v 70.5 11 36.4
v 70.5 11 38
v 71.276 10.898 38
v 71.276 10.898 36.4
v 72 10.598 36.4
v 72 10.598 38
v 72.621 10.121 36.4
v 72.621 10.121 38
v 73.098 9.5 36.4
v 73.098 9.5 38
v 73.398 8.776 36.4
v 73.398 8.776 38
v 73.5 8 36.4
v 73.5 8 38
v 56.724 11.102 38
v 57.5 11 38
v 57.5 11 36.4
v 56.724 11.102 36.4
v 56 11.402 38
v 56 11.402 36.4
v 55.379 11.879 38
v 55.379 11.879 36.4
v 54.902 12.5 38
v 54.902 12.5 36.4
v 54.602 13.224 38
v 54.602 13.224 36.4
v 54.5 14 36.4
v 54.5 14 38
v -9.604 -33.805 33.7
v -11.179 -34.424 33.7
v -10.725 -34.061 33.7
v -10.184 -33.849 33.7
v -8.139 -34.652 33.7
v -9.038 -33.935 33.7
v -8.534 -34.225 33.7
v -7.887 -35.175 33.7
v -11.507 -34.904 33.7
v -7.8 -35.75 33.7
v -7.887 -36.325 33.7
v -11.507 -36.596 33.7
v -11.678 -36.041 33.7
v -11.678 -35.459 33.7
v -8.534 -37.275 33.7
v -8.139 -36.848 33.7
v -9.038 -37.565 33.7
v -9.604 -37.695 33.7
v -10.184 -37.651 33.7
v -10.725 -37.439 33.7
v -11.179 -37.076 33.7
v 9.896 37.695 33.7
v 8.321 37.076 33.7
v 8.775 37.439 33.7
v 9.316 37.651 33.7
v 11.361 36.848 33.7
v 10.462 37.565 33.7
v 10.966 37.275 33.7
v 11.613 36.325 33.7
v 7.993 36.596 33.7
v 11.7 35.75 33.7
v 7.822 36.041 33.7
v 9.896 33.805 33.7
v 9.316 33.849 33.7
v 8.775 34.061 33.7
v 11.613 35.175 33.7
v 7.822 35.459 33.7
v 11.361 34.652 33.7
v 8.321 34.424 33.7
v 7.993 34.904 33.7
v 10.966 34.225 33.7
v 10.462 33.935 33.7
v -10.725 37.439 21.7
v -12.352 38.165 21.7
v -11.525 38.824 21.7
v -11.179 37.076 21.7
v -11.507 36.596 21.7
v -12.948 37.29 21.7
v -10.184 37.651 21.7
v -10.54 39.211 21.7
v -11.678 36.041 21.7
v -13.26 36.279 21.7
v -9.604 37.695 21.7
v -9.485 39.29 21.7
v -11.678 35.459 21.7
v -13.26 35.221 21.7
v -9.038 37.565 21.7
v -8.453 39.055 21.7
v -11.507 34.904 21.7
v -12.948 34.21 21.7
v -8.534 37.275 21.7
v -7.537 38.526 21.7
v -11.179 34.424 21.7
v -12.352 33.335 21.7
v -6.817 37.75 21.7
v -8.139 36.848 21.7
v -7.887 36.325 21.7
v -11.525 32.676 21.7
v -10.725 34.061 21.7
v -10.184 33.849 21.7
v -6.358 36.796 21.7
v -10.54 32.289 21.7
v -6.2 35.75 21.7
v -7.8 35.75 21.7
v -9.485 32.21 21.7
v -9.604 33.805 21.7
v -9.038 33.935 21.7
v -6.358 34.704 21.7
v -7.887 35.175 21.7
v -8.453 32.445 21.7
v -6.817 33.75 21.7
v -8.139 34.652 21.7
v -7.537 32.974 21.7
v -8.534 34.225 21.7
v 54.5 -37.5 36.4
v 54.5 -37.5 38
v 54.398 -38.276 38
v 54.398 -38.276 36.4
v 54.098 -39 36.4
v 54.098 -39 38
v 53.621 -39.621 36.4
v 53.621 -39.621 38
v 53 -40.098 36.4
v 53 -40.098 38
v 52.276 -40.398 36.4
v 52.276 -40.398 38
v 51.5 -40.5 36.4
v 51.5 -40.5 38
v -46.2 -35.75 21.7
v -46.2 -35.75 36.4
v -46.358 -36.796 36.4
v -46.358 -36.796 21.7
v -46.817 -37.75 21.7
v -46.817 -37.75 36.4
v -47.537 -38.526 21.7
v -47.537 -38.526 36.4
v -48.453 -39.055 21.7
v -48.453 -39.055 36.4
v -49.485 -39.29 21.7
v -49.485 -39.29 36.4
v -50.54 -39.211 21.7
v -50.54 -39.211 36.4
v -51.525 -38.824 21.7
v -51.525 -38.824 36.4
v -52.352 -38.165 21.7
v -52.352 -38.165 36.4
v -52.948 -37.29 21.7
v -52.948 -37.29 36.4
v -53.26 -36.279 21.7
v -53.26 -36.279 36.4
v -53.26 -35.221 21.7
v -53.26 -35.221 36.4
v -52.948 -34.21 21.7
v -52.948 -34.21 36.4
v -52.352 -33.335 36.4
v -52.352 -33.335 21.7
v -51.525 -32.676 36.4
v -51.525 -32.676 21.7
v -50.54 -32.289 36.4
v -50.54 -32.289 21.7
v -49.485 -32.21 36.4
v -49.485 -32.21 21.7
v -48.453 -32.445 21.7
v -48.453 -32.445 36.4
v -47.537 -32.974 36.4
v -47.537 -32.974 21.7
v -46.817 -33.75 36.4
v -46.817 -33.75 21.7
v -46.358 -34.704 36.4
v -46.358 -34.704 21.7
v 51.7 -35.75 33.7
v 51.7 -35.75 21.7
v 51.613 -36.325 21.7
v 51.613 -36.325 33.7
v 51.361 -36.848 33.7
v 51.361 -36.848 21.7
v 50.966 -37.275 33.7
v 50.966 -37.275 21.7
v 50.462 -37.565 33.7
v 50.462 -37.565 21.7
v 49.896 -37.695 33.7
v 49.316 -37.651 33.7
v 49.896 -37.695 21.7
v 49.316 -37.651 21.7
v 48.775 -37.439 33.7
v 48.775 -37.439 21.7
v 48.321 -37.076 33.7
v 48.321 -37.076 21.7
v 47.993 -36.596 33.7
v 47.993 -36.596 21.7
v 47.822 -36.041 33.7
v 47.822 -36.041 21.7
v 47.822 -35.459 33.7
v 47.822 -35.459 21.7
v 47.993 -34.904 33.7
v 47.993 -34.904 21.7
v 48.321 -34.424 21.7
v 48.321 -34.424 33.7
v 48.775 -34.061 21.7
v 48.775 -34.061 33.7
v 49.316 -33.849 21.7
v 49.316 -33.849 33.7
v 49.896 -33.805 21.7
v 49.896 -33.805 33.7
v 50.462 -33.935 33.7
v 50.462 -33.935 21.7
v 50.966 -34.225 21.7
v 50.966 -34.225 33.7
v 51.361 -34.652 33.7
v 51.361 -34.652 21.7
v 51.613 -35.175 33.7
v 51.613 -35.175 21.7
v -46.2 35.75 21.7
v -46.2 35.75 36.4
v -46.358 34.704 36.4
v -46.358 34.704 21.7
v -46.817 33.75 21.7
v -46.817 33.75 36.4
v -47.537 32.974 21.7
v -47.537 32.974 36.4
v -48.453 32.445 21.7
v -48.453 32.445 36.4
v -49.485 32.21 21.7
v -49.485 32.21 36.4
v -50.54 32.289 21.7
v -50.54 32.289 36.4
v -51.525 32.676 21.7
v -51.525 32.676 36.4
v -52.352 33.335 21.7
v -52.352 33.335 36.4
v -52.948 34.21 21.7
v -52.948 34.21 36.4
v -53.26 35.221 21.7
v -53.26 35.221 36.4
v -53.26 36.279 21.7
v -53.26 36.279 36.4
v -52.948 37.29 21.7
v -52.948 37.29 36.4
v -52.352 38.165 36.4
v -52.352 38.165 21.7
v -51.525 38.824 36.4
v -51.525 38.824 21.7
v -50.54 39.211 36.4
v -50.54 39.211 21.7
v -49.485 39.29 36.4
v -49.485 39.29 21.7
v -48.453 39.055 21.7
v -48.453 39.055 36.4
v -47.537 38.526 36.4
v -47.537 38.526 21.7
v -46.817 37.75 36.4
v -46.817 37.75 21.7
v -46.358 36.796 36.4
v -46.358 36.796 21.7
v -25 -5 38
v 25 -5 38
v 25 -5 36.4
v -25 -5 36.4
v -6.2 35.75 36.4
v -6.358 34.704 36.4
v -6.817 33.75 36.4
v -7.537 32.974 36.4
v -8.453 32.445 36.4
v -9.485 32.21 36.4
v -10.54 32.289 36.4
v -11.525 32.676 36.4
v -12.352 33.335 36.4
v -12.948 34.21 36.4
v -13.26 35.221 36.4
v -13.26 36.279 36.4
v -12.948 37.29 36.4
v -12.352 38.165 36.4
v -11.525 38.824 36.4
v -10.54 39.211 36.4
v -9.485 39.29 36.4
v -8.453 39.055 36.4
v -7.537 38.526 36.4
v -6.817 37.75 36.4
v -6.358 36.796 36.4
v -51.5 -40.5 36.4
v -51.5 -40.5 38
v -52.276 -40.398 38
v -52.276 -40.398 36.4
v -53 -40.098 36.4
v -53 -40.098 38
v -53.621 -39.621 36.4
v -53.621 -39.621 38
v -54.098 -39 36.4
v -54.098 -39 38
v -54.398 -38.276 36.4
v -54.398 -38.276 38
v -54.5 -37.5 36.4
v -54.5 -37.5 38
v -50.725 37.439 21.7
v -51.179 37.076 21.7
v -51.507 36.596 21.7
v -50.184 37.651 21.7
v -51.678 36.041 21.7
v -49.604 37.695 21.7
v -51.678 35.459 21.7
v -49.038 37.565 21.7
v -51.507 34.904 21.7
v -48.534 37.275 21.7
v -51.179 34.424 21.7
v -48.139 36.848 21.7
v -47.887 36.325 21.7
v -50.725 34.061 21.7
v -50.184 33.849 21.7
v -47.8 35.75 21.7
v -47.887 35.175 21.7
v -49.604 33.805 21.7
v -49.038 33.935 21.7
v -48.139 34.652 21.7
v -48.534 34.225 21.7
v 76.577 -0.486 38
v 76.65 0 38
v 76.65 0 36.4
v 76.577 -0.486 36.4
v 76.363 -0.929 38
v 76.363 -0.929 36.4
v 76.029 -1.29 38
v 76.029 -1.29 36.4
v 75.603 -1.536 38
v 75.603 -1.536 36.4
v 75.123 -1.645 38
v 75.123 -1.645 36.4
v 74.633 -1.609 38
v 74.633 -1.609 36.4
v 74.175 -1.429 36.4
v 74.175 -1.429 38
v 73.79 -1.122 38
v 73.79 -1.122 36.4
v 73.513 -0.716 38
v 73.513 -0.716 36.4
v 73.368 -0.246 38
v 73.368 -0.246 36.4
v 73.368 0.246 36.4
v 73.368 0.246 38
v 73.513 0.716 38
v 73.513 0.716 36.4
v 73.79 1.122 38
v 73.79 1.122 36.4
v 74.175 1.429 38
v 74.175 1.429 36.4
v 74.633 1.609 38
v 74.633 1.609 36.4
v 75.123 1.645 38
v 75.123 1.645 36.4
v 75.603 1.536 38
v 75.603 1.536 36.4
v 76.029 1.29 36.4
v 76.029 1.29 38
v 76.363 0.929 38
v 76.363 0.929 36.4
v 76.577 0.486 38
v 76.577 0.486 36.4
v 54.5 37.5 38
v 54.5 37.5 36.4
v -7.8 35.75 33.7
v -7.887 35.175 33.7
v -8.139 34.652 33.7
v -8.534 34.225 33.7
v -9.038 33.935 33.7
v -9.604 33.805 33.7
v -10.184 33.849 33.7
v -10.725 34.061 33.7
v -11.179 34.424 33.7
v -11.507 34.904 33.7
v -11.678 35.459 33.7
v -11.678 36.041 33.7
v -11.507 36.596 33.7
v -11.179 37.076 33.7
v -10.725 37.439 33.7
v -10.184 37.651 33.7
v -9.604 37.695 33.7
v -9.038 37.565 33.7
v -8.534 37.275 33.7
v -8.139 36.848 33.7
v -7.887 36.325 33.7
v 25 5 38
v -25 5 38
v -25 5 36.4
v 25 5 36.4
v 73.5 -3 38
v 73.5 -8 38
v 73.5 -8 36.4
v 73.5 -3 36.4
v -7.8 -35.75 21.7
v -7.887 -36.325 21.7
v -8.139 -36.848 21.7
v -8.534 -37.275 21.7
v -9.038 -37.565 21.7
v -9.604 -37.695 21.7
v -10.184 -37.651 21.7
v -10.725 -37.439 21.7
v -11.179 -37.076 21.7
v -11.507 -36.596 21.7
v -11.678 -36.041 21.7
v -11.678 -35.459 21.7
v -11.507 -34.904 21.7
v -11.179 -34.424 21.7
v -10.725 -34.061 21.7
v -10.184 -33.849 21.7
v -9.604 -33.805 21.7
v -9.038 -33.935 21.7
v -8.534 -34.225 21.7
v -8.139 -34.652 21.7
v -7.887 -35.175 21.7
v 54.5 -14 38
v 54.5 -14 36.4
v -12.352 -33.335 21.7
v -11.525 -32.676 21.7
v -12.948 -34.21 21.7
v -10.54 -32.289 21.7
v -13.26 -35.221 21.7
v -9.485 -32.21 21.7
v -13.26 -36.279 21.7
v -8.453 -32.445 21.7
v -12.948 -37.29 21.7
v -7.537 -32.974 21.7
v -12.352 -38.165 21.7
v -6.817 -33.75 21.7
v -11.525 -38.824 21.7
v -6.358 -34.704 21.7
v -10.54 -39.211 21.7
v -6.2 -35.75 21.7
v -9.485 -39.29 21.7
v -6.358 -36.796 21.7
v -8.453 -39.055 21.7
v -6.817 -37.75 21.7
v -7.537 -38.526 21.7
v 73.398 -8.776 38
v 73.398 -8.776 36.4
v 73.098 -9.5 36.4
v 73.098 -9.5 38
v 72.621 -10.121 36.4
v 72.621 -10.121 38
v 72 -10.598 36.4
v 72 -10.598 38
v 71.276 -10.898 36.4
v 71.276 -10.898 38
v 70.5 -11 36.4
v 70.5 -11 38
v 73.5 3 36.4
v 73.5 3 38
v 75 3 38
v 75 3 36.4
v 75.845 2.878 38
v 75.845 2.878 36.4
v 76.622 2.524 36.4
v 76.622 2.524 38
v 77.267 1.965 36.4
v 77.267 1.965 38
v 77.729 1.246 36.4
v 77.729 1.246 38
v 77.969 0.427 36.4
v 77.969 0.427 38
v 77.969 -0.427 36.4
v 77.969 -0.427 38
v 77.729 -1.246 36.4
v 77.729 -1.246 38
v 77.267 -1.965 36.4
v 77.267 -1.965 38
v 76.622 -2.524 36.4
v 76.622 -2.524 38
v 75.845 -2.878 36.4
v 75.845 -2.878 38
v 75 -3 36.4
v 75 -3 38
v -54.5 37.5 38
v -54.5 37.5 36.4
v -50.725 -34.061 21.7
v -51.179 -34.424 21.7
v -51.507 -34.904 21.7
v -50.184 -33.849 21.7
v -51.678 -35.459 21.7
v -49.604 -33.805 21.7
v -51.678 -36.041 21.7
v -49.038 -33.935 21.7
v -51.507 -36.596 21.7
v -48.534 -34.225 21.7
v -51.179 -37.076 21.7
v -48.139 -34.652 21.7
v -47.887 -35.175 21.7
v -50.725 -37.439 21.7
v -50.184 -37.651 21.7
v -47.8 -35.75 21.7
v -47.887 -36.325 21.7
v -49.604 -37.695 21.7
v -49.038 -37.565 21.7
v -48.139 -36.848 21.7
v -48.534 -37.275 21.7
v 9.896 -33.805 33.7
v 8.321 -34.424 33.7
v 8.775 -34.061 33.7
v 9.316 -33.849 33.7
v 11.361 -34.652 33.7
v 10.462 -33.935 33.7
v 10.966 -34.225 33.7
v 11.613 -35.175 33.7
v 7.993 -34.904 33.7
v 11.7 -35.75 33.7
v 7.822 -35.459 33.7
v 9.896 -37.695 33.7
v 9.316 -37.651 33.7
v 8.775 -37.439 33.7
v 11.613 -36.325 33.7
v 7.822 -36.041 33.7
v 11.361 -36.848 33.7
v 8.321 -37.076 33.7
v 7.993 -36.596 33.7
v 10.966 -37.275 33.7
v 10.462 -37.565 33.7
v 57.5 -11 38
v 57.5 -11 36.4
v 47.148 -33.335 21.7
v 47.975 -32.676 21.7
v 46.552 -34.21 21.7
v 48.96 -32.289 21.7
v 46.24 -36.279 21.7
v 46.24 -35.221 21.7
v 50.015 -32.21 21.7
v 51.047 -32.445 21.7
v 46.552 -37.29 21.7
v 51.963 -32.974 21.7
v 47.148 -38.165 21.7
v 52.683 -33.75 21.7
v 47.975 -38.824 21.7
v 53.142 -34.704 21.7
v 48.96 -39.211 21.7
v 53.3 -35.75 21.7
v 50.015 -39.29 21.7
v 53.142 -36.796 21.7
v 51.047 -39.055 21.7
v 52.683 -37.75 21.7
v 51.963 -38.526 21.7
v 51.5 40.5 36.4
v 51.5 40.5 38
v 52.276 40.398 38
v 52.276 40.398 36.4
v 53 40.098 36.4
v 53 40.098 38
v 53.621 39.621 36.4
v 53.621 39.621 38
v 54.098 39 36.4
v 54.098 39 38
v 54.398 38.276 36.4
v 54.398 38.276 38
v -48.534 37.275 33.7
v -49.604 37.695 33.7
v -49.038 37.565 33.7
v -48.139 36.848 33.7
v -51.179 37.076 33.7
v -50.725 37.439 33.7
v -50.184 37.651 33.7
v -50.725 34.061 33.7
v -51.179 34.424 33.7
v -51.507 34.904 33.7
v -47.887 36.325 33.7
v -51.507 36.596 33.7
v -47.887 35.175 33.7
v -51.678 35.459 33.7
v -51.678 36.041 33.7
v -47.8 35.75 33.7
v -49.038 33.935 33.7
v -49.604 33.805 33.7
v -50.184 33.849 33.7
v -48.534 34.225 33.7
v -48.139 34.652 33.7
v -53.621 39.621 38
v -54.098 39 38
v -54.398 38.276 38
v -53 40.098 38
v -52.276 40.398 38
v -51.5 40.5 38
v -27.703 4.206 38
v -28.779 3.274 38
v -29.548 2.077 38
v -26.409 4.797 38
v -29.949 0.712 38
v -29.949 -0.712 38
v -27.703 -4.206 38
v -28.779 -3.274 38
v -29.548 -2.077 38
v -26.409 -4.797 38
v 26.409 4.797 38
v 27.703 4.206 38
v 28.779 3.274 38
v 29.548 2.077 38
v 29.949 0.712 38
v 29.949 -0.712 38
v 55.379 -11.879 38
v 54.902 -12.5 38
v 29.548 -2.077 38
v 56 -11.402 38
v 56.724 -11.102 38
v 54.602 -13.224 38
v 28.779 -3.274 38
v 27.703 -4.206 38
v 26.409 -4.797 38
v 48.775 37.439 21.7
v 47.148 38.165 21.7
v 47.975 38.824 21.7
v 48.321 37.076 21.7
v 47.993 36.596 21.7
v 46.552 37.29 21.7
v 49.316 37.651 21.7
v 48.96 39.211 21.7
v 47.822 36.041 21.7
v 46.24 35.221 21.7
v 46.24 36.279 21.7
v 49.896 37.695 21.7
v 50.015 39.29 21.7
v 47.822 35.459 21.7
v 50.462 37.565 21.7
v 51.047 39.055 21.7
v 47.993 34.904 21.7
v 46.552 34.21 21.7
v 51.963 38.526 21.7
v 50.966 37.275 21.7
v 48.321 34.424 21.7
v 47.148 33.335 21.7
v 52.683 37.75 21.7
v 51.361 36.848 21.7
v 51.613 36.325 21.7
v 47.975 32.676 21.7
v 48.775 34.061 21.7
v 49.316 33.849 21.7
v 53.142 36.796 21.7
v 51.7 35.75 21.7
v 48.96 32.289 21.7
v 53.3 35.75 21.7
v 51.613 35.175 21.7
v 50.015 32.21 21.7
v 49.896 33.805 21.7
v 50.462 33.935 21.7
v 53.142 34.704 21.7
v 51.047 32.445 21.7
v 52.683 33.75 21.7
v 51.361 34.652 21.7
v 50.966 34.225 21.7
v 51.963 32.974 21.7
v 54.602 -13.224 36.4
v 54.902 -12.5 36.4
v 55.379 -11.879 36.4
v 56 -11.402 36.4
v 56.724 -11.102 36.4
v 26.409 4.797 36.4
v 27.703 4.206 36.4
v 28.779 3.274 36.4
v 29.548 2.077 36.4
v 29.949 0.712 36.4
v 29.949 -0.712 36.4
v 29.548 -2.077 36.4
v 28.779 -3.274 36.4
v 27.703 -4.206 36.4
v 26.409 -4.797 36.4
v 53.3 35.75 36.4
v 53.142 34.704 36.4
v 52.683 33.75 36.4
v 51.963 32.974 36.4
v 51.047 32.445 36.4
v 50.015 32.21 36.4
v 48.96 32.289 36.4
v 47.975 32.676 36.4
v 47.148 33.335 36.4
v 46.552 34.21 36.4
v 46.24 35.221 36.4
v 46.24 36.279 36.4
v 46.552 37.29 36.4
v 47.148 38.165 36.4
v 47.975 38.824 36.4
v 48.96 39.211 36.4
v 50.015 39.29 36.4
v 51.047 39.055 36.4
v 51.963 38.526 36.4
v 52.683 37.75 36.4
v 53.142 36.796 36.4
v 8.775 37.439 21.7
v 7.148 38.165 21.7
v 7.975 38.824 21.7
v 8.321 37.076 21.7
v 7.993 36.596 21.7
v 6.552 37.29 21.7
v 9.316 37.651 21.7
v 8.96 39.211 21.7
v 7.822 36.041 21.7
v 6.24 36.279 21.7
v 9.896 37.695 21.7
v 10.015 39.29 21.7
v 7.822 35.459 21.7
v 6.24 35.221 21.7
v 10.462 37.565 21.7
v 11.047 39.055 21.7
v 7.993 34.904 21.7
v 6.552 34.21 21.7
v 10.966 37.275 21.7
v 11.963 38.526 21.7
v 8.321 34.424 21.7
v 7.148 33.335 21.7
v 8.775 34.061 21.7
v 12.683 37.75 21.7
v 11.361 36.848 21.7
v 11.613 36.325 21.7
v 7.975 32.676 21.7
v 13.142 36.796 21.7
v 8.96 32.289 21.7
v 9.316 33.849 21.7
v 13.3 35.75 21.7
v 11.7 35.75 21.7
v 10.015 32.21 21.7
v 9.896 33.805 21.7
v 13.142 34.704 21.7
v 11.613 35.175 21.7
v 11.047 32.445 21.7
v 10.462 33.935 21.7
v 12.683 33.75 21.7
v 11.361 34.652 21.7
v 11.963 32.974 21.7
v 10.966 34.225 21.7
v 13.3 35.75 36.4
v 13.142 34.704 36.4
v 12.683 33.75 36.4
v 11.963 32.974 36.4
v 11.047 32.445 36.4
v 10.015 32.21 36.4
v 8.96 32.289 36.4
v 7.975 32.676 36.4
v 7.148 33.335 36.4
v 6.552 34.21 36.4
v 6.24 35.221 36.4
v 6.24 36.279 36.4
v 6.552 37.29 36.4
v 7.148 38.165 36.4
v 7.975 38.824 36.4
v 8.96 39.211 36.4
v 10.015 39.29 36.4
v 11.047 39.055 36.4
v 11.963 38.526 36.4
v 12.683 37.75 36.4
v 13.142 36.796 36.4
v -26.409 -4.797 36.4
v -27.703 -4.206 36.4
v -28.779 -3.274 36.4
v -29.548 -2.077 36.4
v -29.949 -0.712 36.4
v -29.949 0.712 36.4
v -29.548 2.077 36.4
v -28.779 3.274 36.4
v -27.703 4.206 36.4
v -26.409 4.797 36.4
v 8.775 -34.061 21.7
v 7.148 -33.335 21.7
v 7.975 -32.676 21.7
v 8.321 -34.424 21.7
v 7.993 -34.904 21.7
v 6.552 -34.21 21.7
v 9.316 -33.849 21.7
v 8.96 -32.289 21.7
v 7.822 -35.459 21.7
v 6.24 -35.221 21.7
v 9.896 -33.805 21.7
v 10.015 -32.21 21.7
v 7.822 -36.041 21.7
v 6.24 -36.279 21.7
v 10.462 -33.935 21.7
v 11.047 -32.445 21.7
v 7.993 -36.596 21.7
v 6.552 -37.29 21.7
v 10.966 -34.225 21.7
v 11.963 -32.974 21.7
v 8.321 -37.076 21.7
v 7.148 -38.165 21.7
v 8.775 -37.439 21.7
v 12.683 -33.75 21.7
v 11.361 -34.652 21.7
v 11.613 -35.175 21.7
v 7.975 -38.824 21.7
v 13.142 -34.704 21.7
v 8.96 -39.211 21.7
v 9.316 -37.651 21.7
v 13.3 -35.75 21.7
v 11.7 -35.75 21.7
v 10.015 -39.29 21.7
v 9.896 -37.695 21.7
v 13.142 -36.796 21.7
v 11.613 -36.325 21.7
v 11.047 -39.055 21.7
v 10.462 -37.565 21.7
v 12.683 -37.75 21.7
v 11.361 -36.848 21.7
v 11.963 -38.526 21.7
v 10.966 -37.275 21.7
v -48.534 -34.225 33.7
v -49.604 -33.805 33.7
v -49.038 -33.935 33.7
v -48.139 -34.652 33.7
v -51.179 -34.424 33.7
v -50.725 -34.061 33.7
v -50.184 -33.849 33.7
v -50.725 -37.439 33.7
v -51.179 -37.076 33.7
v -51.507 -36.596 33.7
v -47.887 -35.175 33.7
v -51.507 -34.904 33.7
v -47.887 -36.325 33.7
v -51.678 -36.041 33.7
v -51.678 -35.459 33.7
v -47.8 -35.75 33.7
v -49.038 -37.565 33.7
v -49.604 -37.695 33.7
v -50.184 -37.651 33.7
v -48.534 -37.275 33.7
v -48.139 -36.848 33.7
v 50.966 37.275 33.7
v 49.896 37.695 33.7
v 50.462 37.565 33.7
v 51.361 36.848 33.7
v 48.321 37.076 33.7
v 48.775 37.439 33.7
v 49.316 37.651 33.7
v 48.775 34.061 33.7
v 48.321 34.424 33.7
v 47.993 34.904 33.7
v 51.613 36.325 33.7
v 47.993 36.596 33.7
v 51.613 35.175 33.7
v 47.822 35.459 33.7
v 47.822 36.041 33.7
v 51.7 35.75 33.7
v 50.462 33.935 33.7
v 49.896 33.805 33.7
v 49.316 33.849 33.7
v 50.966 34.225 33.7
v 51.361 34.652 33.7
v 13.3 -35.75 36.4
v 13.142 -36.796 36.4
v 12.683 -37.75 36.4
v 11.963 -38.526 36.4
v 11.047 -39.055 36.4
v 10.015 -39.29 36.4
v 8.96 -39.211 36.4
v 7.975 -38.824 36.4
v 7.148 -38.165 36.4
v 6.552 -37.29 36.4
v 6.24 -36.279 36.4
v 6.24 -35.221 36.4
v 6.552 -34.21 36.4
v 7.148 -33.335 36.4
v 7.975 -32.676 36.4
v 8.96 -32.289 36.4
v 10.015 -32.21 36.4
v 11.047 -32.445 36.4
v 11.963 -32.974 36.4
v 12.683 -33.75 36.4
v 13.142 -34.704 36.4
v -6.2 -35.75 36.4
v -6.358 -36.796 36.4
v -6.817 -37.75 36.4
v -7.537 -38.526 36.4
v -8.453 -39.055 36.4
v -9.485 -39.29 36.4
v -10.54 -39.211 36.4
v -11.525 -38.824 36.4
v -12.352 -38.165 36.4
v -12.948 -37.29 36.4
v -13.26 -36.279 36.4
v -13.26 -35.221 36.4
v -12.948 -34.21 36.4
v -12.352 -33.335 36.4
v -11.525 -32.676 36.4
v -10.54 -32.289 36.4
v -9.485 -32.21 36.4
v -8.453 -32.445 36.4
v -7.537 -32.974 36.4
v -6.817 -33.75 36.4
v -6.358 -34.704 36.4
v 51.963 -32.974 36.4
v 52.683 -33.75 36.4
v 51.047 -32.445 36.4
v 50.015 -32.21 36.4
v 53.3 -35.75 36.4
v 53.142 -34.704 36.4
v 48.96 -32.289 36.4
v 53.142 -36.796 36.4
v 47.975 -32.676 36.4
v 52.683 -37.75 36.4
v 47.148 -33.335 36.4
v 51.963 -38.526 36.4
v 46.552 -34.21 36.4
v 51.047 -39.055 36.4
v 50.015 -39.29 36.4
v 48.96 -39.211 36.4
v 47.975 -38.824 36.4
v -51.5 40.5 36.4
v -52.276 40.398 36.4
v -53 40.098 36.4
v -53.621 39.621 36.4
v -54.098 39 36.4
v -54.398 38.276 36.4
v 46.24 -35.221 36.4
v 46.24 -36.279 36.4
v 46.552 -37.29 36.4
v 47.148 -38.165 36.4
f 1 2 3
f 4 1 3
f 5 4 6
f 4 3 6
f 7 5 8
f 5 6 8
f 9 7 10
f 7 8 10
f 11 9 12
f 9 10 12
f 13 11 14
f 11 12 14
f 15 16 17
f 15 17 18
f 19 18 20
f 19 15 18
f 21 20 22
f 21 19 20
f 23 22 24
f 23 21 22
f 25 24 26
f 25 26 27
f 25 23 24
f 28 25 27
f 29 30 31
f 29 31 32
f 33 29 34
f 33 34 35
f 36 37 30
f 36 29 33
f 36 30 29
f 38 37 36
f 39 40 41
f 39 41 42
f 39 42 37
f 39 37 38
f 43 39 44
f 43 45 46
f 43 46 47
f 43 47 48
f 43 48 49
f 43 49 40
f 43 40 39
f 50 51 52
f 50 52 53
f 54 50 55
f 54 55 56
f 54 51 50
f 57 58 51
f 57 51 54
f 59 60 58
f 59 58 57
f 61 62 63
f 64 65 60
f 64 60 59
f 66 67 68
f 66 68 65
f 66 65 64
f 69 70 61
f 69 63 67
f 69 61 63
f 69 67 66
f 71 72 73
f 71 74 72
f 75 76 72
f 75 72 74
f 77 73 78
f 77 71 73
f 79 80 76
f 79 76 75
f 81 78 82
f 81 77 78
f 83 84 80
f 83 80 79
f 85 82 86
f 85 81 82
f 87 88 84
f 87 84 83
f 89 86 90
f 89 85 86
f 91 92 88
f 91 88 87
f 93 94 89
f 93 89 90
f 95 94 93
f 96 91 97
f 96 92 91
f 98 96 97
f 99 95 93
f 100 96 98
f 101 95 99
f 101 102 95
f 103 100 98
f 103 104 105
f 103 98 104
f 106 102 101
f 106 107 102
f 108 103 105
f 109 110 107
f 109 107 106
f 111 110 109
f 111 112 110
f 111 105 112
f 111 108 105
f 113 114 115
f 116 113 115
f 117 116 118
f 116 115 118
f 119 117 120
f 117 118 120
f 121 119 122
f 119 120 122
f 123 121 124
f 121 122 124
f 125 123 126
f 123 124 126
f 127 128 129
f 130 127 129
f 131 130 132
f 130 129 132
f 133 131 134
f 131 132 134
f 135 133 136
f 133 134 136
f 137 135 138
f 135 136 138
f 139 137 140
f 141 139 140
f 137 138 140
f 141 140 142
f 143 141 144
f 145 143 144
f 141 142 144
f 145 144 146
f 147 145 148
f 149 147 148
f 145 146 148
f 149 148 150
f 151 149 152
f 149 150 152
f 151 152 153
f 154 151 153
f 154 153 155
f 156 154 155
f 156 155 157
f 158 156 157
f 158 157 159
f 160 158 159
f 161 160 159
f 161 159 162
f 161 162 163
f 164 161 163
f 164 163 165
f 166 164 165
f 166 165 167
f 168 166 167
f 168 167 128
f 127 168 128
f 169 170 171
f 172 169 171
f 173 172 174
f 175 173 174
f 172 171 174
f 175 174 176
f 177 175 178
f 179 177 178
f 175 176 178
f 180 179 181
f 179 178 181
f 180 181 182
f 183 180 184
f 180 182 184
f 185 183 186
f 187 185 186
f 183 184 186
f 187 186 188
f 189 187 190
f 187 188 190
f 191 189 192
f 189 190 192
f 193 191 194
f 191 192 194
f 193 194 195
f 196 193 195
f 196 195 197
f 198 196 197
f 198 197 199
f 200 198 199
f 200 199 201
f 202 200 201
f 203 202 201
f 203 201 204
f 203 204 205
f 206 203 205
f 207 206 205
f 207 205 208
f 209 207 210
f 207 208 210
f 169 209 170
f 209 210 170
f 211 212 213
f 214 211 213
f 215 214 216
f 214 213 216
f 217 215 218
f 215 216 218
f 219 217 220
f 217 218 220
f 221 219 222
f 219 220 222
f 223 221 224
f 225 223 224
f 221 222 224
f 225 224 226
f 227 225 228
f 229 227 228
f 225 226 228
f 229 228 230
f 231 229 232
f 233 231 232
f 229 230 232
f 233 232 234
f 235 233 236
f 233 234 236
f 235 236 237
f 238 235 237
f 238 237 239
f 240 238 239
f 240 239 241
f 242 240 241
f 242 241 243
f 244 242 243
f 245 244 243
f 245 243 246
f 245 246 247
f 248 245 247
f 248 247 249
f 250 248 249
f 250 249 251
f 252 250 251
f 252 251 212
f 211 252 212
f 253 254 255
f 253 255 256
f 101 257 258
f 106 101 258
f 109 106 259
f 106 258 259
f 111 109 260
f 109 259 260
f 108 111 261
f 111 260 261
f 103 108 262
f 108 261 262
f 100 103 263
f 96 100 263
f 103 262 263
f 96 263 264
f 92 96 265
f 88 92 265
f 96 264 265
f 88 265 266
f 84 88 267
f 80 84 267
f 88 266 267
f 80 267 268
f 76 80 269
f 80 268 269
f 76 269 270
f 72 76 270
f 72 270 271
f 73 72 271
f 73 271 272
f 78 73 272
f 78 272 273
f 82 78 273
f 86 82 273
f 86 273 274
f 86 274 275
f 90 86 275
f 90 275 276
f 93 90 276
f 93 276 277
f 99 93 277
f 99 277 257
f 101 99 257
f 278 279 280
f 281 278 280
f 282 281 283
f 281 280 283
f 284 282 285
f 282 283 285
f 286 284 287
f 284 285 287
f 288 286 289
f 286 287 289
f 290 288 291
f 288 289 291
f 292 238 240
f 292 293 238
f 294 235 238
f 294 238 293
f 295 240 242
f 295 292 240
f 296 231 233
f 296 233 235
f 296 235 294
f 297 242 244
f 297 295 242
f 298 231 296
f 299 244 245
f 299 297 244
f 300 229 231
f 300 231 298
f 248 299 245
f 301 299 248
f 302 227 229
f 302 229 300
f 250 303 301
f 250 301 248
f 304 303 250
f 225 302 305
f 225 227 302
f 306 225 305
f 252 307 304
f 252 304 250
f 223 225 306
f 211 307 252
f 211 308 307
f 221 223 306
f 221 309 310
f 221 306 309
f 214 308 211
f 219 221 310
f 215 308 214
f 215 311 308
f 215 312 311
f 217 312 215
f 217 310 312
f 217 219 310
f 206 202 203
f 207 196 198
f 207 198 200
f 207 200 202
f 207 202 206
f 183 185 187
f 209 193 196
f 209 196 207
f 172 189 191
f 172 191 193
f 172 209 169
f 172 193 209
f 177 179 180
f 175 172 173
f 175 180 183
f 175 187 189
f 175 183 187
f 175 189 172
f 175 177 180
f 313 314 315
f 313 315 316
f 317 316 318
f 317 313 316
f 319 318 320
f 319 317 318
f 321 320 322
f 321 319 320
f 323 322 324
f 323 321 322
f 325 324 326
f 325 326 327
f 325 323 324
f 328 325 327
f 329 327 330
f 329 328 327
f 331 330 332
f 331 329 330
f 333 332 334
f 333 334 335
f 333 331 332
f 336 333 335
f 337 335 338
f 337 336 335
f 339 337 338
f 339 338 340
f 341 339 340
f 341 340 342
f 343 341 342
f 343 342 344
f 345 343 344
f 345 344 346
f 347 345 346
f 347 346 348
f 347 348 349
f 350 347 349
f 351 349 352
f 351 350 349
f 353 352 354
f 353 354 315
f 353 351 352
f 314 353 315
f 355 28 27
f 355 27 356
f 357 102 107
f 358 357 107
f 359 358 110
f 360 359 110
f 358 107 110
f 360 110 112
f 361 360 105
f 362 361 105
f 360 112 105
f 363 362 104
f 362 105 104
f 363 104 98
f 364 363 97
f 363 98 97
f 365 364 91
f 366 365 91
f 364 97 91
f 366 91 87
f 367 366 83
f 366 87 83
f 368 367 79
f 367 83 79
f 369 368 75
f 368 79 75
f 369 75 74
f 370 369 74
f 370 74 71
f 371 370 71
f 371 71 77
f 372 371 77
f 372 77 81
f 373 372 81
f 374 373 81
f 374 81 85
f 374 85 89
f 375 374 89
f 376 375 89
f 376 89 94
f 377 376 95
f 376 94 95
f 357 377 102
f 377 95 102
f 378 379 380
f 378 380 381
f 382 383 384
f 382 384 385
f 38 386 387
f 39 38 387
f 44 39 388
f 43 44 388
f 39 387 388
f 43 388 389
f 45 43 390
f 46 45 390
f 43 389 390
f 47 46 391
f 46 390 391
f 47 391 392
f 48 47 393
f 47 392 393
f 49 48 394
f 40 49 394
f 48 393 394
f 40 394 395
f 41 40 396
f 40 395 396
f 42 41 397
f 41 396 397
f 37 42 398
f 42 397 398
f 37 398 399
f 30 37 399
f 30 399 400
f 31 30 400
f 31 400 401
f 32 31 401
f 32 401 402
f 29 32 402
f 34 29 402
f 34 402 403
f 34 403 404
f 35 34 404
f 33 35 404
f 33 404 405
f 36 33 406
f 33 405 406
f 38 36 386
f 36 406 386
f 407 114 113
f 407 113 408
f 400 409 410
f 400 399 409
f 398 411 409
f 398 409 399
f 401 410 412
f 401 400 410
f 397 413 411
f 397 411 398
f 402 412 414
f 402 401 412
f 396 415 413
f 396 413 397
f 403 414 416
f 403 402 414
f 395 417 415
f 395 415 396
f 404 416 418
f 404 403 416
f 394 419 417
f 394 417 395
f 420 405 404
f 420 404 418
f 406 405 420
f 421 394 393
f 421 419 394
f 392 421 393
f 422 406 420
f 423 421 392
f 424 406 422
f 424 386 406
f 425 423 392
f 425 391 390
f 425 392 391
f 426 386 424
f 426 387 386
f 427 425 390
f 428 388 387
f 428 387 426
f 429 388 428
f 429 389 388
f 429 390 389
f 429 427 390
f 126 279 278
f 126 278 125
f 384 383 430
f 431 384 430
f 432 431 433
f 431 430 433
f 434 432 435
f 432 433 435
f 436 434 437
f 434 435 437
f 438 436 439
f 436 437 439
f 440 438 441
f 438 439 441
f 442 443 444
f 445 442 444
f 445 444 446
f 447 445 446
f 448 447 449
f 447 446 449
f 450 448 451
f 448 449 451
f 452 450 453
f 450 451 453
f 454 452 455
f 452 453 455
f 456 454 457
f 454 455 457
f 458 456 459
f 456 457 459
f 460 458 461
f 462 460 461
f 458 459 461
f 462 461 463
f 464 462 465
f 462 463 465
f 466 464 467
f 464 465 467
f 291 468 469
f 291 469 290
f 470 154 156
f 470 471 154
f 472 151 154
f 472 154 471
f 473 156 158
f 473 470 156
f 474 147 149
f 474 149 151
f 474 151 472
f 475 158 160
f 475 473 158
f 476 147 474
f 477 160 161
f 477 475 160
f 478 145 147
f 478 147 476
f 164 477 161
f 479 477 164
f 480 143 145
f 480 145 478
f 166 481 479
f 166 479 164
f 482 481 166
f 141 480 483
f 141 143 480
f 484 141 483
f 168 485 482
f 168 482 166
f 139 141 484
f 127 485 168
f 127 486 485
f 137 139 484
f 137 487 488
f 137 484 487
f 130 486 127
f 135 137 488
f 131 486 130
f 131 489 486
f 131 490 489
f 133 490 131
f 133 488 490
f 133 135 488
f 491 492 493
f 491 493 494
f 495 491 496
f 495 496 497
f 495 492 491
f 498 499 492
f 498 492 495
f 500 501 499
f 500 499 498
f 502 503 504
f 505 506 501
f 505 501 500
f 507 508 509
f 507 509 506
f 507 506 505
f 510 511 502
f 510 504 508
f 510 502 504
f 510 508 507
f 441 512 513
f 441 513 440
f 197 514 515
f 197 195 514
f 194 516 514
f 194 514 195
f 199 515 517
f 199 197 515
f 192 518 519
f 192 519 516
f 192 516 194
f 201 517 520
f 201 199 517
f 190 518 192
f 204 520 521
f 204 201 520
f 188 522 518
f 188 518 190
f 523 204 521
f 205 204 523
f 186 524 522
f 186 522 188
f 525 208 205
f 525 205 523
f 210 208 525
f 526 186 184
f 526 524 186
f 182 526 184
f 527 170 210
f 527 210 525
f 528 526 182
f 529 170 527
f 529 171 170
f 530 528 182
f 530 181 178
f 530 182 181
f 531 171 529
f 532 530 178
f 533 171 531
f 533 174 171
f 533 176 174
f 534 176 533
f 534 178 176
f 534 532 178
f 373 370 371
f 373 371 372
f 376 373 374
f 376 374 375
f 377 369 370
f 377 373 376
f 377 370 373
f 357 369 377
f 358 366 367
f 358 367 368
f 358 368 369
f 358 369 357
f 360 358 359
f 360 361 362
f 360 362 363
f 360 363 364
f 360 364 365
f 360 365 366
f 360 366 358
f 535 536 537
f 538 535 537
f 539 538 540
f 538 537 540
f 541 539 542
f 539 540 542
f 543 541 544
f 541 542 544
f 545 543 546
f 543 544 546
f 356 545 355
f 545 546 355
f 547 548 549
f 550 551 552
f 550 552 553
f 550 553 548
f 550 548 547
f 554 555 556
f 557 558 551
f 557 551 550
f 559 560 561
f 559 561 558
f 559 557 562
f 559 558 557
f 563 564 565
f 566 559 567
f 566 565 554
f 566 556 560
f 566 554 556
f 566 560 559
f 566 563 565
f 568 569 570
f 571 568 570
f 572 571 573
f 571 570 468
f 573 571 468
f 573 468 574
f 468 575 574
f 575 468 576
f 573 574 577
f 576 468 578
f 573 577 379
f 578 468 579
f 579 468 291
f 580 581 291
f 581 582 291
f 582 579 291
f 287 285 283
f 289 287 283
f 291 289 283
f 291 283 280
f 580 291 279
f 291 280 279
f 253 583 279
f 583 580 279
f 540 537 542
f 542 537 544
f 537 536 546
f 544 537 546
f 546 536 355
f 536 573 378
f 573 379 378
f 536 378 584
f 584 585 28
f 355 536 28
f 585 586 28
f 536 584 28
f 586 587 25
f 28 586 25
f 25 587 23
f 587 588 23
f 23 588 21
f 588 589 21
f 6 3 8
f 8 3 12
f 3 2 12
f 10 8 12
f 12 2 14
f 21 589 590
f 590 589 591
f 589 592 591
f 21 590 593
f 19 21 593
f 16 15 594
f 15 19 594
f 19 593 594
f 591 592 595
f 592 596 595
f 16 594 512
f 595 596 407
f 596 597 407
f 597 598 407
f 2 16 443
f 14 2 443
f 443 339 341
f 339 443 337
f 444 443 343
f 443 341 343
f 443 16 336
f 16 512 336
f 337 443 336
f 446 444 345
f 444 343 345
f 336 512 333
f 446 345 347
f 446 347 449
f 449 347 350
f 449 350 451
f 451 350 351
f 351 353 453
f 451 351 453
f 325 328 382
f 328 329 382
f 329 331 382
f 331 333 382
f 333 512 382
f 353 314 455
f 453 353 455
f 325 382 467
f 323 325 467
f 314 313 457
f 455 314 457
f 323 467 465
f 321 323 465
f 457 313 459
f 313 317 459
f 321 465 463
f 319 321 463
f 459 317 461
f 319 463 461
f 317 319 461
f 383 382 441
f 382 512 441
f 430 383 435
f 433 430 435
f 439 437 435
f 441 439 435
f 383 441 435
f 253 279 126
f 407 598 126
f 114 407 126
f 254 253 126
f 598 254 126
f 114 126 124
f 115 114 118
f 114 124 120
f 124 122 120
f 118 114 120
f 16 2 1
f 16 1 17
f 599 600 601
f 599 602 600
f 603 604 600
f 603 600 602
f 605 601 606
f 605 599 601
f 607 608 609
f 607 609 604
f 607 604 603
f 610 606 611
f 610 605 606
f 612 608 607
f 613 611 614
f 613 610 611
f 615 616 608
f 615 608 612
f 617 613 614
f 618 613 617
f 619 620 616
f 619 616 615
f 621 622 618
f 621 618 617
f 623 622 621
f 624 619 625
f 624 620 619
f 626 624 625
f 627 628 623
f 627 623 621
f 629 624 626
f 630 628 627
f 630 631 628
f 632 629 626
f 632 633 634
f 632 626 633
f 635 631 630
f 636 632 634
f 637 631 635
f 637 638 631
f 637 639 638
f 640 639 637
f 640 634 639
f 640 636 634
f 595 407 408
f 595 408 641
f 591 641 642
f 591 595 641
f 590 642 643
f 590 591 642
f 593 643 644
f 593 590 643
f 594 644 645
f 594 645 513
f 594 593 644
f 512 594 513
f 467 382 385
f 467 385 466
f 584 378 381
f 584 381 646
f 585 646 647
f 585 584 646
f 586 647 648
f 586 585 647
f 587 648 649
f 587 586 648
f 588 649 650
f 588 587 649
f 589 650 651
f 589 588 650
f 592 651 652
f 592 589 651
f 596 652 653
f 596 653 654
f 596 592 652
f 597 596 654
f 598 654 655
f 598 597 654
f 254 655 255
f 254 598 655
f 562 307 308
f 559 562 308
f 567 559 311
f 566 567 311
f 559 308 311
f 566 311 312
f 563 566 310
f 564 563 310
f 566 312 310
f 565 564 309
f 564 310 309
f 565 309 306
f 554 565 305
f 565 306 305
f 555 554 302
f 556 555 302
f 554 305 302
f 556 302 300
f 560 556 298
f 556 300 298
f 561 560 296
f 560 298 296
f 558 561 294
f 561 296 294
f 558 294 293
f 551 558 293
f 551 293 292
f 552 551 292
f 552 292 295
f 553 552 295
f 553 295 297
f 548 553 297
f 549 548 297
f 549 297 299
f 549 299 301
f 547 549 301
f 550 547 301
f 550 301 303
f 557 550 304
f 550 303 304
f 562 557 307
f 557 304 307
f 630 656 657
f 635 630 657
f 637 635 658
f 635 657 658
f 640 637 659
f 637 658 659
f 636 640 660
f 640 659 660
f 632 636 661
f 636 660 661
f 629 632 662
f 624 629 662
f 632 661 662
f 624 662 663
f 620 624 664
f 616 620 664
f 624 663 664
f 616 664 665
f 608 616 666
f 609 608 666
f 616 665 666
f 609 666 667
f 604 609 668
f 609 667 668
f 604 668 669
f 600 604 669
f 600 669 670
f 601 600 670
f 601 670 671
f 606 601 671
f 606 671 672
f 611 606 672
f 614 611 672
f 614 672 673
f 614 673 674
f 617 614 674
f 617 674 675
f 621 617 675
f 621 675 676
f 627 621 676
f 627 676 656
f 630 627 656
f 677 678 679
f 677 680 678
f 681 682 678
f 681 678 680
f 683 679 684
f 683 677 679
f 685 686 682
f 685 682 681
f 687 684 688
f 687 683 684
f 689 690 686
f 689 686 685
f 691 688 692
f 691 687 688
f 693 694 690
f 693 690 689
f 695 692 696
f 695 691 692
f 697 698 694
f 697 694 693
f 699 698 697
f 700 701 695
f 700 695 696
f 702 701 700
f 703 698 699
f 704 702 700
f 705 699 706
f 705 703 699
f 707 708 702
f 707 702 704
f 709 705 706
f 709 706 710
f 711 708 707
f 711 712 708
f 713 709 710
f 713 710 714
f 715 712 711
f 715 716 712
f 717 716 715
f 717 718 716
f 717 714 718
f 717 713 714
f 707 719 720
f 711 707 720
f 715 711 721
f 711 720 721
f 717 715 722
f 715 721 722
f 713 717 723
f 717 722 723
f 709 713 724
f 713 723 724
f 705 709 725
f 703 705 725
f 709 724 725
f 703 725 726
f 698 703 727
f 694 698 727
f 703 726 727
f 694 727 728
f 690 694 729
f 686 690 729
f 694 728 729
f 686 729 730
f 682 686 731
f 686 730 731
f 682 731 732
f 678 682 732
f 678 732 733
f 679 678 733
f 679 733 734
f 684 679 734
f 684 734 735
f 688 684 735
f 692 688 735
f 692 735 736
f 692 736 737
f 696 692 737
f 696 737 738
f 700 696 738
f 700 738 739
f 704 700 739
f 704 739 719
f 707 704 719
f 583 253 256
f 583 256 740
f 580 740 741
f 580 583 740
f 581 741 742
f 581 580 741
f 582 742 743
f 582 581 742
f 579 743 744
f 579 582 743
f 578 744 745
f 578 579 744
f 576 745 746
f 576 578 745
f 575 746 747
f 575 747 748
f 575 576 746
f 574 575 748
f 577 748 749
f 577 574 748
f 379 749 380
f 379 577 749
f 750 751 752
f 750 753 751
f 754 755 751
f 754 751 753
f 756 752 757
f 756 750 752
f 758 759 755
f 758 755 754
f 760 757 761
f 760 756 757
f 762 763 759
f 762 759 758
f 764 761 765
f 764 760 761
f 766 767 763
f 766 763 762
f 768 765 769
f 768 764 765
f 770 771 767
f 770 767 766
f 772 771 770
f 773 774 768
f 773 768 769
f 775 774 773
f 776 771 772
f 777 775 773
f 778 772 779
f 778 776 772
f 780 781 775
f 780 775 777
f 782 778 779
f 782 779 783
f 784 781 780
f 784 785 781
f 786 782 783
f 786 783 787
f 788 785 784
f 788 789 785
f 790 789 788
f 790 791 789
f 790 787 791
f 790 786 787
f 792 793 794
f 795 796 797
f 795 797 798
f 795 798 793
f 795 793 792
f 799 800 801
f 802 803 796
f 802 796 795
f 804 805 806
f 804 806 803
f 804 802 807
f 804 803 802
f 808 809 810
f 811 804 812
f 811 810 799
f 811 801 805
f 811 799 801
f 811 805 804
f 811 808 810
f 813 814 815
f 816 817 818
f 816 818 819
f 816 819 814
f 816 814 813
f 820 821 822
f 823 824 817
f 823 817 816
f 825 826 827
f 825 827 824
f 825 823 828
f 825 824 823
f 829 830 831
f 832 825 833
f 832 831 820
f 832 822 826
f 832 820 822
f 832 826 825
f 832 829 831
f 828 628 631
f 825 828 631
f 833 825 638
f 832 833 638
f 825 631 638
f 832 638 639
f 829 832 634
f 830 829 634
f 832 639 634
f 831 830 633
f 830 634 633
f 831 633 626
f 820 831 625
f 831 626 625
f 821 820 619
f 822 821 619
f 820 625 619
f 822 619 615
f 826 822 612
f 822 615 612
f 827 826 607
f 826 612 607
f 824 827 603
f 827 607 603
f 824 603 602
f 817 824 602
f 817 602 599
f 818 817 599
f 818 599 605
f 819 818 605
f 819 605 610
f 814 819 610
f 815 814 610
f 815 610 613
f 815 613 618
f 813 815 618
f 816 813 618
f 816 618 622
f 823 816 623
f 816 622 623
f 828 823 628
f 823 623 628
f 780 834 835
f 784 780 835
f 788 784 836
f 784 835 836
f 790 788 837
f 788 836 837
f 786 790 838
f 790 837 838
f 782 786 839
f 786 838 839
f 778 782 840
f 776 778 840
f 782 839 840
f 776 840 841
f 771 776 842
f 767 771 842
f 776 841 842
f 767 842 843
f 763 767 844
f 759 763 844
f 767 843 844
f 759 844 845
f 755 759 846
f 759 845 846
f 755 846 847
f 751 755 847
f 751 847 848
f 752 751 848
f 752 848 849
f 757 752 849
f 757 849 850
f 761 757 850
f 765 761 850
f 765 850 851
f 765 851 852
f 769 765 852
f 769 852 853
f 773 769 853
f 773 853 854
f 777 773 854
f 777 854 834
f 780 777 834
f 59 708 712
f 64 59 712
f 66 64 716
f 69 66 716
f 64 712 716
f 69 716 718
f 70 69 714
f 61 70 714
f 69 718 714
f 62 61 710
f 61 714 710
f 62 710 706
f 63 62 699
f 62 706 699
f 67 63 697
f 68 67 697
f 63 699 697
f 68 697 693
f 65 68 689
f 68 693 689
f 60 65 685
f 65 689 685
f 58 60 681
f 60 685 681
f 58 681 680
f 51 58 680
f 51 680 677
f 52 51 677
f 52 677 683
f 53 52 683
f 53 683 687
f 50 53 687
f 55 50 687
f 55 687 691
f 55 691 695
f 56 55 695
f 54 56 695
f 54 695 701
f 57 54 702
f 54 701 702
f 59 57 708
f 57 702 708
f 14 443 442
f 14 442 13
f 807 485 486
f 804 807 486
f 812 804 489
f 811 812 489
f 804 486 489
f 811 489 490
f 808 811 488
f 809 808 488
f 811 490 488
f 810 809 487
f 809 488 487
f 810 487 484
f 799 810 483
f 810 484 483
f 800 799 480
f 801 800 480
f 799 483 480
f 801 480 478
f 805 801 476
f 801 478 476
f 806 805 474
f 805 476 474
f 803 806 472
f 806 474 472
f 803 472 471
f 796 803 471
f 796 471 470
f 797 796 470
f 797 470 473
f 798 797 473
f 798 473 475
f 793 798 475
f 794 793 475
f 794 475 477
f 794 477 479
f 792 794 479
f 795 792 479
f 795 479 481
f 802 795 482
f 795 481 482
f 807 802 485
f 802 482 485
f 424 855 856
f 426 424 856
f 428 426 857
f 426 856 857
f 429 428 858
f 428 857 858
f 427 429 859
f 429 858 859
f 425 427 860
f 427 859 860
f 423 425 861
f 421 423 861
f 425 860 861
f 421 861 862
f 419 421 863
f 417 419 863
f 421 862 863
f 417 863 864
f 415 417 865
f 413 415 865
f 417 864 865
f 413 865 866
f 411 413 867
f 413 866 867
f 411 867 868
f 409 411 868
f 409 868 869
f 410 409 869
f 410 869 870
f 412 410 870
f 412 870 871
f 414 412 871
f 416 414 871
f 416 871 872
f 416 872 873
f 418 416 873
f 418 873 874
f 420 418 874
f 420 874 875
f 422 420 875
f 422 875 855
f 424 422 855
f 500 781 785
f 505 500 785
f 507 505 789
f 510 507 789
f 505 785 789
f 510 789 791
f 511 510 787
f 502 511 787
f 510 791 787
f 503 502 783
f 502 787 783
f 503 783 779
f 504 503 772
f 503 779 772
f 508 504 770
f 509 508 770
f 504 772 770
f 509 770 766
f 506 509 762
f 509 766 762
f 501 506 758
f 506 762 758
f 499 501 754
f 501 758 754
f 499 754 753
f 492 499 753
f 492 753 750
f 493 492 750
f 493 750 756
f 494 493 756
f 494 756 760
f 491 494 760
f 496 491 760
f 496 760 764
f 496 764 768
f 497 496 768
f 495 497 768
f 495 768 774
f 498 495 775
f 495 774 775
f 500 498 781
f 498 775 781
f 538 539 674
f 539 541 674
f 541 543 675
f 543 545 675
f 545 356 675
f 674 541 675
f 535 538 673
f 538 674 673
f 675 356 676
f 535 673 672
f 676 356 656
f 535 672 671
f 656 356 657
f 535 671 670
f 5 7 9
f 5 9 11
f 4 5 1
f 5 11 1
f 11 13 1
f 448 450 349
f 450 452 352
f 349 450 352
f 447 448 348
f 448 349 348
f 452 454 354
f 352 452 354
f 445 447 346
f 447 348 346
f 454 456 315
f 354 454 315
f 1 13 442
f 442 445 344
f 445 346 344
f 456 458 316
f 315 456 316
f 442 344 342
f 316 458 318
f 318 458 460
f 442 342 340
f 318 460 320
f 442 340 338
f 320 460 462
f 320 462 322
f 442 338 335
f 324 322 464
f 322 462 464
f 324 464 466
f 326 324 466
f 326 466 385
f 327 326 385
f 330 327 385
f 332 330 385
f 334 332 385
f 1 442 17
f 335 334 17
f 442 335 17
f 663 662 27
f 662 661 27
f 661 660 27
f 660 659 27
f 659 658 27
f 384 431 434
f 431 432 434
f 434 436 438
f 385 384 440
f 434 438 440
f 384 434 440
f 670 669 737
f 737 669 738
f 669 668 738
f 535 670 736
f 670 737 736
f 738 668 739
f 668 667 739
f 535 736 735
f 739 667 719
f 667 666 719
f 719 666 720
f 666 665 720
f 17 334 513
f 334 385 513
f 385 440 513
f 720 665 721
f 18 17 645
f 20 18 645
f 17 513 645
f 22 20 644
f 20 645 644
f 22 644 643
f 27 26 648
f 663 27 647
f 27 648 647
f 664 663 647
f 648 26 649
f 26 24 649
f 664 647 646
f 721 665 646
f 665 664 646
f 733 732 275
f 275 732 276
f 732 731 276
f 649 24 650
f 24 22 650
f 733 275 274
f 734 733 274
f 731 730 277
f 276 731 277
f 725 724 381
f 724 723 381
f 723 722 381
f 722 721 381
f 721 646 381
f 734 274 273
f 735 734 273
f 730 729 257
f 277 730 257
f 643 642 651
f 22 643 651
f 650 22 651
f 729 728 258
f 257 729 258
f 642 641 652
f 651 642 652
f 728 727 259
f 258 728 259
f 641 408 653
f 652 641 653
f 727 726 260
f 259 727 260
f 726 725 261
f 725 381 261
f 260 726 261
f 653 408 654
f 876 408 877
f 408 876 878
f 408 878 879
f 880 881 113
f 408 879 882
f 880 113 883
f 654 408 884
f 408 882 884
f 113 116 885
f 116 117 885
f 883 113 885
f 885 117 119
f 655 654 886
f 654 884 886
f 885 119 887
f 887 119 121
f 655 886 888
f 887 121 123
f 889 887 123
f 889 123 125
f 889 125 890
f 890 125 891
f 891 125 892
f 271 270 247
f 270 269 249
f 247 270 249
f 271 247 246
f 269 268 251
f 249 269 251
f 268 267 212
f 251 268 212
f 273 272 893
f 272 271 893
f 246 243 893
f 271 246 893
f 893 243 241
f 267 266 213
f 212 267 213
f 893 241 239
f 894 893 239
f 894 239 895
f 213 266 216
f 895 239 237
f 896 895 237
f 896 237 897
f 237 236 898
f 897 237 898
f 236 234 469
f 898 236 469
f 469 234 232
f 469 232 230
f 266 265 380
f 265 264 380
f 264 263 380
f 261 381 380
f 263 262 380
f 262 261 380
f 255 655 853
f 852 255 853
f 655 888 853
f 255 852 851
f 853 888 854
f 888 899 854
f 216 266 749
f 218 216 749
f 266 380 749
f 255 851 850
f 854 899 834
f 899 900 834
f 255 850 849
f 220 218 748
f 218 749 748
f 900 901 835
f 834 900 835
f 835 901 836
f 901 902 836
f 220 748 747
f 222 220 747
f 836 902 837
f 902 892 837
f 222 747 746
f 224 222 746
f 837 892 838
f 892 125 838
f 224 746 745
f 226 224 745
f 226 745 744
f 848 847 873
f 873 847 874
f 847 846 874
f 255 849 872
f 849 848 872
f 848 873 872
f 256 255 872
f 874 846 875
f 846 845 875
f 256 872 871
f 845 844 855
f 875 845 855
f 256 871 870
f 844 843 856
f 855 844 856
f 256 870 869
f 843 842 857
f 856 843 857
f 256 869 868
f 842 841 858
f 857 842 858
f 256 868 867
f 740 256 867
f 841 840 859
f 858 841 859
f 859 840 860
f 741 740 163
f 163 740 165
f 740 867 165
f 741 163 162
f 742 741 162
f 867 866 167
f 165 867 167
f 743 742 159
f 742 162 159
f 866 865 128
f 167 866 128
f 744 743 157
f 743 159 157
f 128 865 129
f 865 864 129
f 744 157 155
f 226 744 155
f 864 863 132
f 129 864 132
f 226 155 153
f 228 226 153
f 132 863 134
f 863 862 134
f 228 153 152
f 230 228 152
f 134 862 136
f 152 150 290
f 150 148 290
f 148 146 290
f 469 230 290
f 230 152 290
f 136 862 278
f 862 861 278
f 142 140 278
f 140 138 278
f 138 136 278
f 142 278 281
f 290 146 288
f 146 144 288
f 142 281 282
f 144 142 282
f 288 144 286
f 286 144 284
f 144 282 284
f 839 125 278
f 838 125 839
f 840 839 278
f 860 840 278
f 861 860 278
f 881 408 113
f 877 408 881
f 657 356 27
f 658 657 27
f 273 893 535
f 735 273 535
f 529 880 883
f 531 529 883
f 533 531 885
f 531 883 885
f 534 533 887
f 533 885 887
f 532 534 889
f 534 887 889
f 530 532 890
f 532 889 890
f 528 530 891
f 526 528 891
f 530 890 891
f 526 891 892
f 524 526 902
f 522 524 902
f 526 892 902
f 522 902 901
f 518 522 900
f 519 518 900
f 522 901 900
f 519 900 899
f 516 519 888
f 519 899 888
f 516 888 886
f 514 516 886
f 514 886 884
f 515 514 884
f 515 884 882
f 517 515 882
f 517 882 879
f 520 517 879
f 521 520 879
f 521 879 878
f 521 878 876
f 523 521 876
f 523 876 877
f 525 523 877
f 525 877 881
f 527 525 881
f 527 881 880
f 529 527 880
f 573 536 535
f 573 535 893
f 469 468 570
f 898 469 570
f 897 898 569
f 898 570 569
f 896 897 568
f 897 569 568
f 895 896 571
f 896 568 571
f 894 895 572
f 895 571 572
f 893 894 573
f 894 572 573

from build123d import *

# Parameters (mm, degrees)
SKETCH007_R             = 1.65
PAD005_DEPTH            = 1.6
SKETCH008_R             = 3.55
PAD006_DEPTH            = 16.3
SKETCH009_R             = 1.95
POCKET002_DEPTH         = 12
POCKET003_DEPTH         = 1.6
BODY002_PLACEMENT_ANGLE = 180


with BuildPart() as part:
    # Sketch007 → Pad005 (new body)
    with BuildSketch(Plane.XY):
        with BuildLine():
            Line((-51.5, 40.5), (51.5, 40.5))
            ThreePointArc((54.5, 37.5), (53.62132, 39.62132), (51.5, 40.5))
            Line((54.5, 37.5), (54.5, 14))
            ThreePointArc((54.5, 14), (55.37868, 11.87868), (57.5, 11))
            Line((57.5, 11), (70.5, 11))
            ThreePointArc((73.5, 8), (72.62132, 10.12132), (70.5, 11))
            Line((73.5, 8), (73.5, 3))
            Line((73.5, 3), (75, 3))
            ThreePointArc((75, -3), (78, 0), (75, 3))
            Line((73.5, -3), (75, -3))
            Line((73.5, -3), (73.5, -8))
            ThreePointArc((70.5, -11), (72.62132, -10.12132), (73.5, -8))
            Line((70.5, -11), (57.5, -11))
            ThreePointArc((57.5, -11), (55.37868, -11.87868), (54.5, -14))
            Line((54.5, -14), (54.5, -37.5))
            ThreePointArc((51.5, -40.5), (53.62132, -39.62132), (54.5, -37.5))
            Line((51.5, -40.5), (-51.5, -40.5))
            ThreePointArc((-54.5, -37.5), (-53.62132, -39.62132), (-51.5, -40.5))
            Line((-54.5, -37.5), (-54.5, 37.5))
            ThreePointArc((-51.5, 40.5), (-53.62132, 39.62132), (-54.5, 37.5))
        make_face()
        with Locations((75, 0)):
            Circle(SKETCH007_R, mode=Mode.SUBTRACT)
    extrude(amount=PAD005_DEPTH)

    # Sketch008 → Pad006 (join)
    with BuildSketch(Plane.XY):
        with Locations((-49.75, 35.75)):
            Circle(SKETCH008_R)
        with Locations((-9.75, 35.75)):
            Circle(SKETCH008_R)
        with Locations((9.75, 35.75)):
            Circle(SKETCH008_R)
        with Locations((49.75, 35.75)):
            Circle(SKETCH008_R)
        with Locations((49.75, -35.75)):
            Circle(SKETCH008_R)
        with Locations((9.75, -35.75)):
            Circle(SKETCH008_R)
        with Locations((-9.75, -35.75)):
            Circle(SKETCH008_R)
        with Locations((-49.75, -35.75)):
            Circle(SKETCH008_R)
    extrude(amount=PAD006_DEPTH)

    # Sketch009 (on DatumPlane) → Pocket002 (cut)
    with BuildSketch(Plane.XY.offset(16.3)):
        with Locations((-49.75, 35.75)):
            Circle(SKETCH009_R)
        with Locations((-9.75, 35.75)):
            Circle(SKETCH009_R)
        with Locations((9.75, 35.75)):
            Circle(SKETCH009_R)
        with Locations((49.75, 35.75)):
            Circle(SKETCH009_R)
        with Locations((-49.75, -35.75)):
            Circle(SKETCH009_R)
        with Locations((-9.75, -35.75)):
            Circle(SKETCH009_R)
        with Locations((9.75, -35.75)):
            Circle(SKETCH009_R)
        with Locations((49.75, -35.75)):
            Circle(SKETCH009_R)
    extrude(amount=-POCKET002_DEPTH, mode=Mode.SUBTRACT)

    # Sketch011 → Pocket003 (cut)
    with BuildSketch(Plane.XY):
        with BuildLine():
            ThreePointArc((-25, 5), (-30, 0), (-25, -5))
            Line((-25, -5), (25, -5))
            ThreePointArc((25, -5), (30, 0), (25, 5))
            Line((25, 5), (-25, 5))
        make_face()
    extrude(amount=POCKET003_DEPTH, mode=Mode.SUBTRACT)


with BuildPart() as part_1:
    # Body002 placement: moved
    add(part.part.moved(Location((0, 0, 38))).rotate(Axis((0, 0, 38), (1, 0, 0)), BODY002_PLACEMENT_ANGLE))


solid = part_1.part
